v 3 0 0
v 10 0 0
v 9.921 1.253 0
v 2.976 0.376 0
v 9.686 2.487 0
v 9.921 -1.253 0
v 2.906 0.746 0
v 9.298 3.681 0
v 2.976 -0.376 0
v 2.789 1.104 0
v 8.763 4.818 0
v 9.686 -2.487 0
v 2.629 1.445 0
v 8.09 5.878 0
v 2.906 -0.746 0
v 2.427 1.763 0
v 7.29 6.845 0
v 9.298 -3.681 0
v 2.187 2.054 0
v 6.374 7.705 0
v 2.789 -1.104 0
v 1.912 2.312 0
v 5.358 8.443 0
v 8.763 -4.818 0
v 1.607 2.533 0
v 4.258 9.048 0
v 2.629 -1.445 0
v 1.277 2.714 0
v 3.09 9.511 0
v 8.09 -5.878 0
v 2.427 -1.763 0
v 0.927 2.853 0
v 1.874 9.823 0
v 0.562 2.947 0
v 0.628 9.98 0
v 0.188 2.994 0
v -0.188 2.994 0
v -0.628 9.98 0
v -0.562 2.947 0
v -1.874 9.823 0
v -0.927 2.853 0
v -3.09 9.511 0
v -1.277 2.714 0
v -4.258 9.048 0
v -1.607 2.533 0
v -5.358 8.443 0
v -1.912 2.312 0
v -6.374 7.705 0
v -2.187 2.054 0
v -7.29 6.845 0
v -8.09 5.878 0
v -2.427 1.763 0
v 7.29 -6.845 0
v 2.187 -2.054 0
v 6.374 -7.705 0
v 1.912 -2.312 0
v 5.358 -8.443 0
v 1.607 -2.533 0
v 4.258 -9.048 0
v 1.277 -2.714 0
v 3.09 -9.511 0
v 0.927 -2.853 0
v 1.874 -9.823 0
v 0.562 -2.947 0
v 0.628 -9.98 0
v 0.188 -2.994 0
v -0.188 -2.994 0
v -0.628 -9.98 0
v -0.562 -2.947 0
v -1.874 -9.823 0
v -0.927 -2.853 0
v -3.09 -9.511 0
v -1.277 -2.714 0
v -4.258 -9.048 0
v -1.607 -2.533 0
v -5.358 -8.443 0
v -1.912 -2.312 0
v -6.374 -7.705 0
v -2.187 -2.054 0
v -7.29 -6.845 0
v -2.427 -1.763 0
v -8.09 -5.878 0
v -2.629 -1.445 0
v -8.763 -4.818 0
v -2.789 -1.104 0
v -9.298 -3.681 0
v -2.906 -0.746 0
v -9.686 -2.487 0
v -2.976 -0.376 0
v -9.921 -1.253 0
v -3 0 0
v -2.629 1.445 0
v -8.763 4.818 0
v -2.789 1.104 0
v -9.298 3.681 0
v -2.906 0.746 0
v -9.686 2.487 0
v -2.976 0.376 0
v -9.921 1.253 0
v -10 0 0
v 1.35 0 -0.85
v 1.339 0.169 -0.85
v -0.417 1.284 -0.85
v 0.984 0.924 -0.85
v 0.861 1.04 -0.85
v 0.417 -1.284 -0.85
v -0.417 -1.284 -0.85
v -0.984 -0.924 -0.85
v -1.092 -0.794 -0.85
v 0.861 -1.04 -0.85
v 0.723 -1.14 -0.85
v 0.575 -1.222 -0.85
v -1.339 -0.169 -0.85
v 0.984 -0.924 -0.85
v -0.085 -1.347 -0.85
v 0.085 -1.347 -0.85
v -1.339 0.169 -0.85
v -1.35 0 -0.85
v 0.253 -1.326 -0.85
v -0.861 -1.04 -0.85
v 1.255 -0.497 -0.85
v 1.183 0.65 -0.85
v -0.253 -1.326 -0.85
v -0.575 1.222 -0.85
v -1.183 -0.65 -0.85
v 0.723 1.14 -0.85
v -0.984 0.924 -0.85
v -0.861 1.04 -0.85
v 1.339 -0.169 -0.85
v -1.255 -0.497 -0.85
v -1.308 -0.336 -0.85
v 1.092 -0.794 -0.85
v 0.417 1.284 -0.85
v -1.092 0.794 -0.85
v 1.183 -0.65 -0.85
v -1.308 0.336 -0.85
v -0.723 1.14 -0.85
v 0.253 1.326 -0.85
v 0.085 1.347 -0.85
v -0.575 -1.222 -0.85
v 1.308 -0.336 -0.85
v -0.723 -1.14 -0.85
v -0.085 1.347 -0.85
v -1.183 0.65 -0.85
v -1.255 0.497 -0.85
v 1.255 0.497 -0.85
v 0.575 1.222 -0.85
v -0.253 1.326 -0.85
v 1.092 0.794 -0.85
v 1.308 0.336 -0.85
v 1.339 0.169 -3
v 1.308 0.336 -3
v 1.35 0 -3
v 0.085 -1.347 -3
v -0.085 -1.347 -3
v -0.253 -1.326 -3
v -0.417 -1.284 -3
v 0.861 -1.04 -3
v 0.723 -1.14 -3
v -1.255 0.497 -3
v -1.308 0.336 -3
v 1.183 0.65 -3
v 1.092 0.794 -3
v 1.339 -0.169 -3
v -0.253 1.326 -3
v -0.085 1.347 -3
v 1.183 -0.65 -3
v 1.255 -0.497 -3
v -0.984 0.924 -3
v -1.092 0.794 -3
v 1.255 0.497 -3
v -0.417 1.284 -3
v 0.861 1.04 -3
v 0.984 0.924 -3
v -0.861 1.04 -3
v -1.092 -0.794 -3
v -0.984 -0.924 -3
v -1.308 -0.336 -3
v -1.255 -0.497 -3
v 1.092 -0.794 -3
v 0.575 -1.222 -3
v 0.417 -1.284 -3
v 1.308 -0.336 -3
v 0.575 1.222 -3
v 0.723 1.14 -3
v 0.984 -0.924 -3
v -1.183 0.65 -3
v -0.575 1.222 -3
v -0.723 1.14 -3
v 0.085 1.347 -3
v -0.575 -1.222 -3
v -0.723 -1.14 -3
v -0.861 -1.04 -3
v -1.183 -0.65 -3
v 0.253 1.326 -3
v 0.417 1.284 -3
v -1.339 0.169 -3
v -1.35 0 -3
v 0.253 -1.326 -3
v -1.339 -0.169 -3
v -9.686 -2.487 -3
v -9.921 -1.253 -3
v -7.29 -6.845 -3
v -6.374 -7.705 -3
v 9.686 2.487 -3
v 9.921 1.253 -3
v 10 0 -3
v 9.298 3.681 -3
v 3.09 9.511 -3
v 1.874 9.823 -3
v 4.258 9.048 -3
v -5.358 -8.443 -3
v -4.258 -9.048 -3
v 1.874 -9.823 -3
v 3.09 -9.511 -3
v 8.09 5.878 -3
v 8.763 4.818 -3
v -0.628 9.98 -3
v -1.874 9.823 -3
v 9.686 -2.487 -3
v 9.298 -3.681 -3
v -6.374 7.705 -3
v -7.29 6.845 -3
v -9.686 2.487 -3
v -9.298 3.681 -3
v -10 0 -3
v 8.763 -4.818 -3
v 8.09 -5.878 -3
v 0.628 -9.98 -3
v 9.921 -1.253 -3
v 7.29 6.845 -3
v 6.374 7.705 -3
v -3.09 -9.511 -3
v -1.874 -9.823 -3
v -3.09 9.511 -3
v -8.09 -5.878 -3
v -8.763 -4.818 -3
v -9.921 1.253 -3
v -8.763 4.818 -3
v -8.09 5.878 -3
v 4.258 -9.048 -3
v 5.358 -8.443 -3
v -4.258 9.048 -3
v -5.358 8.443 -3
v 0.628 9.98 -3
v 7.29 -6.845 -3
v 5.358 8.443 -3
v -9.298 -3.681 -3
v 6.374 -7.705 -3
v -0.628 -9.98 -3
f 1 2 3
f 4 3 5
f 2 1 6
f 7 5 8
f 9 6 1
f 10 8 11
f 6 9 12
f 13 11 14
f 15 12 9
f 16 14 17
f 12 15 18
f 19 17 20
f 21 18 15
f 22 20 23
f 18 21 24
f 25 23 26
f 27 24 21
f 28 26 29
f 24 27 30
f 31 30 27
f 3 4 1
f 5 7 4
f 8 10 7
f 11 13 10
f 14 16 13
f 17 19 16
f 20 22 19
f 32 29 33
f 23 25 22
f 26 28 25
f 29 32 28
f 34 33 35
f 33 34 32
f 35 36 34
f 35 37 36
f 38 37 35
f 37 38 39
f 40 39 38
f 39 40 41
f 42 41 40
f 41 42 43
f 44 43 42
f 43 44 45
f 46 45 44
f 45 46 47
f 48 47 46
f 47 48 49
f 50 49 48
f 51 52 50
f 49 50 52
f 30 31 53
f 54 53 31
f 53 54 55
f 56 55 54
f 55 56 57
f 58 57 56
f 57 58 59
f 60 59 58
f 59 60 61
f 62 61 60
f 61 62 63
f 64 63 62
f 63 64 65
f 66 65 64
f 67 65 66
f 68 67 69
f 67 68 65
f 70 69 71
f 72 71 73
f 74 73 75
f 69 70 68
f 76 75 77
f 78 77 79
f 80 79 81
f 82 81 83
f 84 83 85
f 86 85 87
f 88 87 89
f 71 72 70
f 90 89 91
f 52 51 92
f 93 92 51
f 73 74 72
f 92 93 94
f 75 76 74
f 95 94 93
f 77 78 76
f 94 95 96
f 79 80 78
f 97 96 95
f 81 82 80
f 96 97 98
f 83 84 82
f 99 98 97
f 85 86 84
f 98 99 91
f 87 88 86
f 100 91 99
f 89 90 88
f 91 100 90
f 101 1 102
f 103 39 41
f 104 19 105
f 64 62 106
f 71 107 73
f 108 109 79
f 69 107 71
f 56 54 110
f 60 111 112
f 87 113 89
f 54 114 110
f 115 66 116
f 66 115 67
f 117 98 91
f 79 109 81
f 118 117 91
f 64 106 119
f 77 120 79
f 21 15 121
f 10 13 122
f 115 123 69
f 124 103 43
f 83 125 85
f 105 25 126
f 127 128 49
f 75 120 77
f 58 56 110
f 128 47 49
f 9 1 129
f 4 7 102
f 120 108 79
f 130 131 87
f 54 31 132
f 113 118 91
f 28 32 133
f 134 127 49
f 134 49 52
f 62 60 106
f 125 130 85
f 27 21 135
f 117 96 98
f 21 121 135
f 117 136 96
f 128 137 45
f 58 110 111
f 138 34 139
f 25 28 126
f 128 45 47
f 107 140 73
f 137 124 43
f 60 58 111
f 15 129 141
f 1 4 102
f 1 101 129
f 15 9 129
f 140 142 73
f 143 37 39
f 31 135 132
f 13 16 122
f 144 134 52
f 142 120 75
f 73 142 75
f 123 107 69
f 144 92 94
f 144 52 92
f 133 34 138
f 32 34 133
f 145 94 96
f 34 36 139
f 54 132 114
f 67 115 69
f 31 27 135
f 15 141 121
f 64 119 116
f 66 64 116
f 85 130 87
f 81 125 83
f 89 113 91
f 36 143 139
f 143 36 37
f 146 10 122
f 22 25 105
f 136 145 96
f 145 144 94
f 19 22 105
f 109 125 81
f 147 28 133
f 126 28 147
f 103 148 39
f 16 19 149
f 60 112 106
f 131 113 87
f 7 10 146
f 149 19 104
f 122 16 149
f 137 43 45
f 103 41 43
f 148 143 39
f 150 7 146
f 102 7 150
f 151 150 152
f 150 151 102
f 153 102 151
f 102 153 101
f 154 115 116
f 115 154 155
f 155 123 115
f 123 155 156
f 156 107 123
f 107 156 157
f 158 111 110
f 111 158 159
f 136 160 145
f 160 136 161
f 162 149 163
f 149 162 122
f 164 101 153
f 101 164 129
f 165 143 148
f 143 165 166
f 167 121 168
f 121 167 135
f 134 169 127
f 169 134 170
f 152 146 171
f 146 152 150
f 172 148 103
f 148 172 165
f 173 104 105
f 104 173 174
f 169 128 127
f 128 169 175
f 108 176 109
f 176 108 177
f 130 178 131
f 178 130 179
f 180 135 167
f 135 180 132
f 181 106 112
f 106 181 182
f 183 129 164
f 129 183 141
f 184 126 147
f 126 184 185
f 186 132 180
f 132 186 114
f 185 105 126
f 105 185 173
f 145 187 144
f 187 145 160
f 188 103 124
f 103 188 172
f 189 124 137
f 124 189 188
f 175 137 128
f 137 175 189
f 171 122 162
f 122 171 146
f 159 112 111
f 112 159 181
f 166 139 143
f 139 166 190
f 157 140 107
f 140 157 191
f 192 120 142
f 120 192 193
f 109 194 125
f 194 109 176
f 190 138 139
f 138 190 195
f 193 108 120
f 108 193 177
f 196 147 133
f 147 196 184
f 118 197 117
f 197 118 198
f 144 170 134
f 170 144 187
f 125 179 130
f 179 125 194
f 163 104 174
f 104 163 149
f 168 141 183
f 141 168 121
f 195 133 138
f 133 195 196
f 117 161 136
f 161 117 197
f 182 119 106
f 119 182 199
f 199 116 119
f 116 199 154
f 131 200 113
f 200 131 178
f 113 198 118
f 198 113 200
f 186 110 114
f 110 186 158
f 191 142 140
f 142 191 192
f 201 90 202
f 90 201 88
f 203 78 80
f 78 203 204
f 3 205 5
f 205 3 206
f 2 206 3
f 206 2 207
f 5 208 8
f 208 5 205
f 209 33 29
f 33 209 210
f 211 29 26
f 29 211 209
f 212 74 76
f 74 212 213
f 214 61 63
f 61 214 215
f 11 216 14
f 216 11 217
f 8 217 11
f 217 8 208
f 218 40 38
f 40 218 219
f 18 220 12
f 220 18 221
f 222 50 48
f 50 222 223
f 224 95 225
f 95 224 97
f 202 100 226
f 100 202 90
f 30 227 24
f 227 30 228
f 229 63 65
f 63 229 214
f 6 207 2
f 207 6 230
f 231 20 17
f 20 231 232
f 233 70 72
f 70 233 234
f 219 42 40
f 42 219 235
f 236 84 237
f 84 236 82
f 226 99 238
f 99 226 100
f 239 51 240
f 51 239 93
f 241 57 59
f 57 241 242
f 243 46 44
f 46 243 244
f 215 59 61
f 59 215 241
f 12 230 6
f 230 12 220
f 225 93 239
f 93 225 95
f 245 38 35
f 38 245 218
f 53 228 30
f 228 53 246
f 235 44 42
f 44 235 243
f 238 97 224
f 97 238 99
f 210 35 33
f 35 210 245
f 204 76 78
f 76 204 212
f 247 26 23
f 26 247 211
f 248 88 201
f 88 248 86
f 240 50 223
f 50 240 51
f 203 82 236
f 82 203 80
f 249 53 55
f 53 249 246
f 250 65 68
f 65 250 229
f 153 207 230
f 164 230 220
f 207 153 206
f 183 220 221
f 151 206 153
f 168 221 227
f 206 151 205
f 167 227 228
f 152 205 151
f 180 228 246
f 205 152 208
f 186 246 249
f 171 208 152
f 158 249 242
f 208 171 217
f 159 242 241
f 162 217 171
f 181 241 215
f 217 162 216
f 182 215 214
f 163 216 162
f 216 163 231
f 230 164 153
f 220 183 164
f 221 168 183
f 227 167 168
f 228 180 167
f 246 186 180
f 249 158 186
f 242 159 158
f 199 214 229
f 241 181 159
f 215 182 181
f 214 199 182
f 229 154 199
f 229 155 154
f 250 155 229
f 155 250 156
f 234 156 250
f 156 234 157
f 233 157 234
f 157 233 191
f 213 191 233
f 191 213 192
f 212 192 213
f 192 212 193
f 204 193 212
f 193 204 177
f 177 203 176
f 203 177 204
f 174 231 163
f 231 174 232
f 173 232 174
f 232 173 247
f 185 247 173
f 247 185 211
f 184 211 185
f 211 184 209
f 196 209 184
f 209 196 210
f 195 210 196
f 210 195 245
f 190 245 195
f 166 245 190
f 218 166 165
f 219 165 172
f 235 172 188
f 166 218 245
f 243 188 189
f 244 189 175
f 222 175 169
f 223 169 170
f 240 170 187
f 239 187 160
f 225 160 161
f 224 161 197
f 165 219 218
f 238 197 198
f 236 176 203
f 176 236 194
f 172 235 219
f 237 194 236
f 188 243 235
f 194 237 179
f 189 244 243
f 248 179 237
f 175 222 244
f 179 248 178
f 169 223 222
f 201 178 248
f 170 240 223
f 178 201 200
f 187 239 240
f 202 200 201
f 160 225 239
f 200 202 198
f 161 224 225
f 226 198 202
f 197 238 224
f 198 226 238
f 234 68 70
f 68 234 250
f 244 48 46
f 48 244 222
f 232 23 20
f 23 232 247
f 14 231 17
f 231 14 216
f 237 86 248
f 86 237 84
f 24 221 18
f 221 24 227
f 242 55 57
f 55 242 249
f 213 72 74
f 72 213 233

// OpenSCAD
$fn = 50;

difference() {
	union() {
		translate(v = [0, 0, -3.0]) {
			cylinder(h = 3, r = 10.0);
		}
	}
	union() {
		translate(v = [0, 0, 0]) {
			rotate(a = [0, 0, 0]) {
				difference() {
					union() {
						translate(v = [0, 0, -6.0]) {
							cylinder(h = 6, r = 1.0);
						}
						translate(v = [0, 0, -0.85]) {
							cylinder(h = 0.85, r1 = 1.35, r2 = 3.0);
						}
						translate(v = [0, 0, -6.0]) {
							cylinder(h = 6, r = 1.35);
						}
						translate(v = [0, 0, -6.0]) {
							cylinder(h = 6, r = 1.0);
						}
					}
					union();
				}
			}
		}
	}
}
